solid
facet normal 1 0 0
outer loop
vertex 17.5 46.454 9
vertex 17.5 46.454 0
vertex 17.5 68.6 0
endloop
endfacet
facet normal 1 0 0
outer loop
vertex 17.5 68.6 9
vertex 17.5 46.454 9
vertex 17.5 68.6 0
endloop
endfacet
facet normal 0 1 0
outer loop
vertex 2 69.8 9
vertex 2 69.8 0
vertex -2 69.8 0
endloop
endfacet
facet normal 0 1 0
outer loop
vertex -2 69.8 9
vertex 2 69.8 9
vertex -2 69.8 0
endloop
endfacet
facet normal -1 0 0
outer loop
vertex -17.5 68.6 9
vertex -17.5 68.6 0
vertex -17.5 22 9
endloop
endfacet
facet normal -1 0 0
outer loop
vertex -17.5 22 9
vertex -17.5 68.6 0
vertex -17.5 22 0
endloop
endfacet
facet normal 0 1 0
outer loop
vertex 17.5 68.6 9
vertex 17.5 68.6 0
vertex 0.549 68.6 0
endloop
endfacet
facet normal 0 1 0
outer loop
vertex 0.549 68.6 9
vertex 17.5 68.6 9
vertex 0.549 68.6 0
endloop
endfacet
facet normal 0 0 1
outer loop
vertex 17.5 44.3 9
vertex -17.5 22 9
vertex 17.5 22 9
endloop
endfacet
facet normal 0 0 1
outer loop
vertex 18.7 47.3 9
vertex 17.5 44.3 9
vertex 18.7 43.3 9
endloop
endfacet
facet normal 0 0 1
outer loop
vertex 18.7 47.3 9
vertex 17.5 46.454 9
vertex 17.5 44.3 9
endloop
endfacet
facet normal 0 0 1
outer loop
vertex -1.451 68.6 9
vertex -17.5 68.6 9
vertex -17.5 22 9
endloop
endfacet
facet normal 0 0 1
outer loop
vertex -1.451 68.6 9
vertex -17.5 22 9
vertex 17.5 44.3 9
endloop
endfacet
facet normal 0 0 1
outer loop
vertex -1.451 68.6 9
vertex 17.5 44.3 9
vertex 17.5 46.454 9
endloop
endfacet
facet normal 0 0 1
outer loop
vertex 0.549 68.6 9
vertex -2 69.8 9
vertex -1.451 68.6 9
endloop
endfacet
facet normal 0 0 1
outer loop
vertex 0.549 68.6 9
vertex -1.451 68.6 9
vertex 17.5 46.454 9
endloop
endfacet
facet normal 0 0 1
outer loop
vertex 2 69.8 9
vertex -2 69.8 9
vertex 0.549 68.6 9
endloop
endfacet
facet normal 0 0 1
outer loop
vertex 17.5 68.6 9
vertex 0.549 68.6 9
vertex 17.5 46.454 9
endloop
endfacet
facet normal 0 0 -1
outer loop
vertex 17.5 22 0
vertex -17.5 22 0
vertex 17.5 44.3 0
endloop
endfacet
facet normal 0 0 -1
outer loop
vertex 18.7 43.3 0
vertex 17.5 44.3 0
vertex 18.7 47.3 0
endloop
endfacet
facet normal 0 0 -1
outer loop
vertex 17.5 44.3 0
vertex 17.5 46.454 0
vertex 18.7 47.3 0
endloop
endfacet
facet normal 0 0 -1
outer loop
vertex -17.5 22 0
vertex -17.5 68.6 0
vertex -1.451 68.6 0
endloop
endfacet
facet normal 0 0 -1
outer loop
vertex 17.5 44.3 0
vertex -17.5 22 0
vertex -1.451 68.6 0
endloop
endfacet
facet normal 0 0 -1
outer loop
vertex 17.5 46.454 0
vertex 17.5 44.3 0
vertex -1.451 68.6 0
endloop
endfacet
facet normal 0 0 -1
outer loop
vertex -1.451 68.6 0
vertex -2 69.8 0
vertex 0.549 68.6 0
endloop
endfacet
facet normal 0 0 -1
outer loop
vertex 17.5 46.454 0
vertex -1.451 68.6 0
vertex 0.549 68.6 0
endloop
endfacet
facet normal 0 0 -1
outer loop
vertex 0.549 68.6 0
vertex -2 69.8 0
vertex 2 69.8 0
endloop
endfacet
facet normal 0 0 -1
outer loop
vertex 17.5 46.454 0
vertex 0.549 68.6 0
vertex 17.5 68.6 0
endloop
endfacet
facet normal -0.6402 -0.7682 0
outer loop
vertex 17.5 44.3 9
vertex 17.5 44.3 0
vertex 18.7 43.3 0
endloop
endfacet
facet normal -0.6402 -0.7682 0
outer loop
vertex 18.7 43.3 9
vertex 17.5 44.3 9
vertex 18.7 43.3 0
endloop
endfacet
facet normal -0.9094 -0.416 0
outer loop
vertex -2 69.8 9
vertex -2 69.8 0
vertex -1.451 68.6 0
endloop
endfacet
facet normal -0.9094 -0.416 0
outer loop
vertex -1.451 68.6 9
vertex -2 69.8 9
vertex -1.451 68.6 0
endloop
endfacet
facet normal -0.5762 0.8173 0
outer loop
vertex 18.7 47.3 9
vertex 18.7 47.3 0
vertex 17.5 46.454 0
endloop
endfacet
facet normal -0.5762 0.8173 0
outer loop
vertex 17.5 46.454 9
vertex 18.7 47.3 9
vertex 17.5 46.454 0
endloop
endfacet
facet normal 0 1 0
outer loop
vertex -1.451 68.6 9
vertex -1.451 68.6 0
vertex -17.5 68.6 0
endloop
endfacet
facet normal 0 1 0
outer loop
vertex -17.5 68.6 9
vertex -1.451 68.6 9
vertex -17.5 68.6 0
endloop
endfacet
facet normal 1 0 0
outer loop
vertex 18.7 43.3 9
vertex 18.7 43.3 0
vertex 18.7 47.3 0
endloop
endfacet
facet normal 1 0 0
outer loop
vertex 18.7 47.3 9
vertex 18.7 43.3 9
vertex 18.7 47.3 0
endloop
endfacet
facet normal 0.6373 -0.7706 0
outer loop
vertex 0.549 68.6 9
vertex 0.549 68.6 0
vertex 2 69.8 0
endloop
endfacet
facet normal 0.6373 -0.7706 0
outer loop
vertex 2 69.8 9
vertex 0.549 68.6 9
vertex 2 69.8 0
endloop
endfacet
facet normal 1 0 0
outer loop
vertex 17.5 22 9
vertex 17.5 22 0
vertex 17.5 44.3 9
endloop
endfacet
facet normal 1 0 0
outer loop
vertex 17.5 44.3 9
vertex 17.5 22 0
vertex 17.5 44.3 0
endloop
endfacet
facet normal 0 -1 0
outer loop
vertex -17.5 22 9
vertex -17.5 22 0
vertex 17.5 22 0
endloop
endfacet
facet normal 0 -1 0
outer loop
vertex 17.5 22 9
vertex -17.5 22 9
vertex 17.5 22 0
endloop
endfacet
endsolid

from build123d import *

# Parameters (mm, degrees)
F0_W      = 50
F0_H      = 30
F1_DEPTH  = 25
F3_DEPTH  = 50
F5_R      = 5
F6_T      = -2.5
F7_R      = 10.7930870798
F8_DEPTH  = 25
F10_DEPTH = 9
F11_W     = 42
F11_H     = 73.1670876886
F12_DEPTH = 22.5


with BuildPart() as f1:
    # F0 (on Top) → F1 (new body)
    with BuildSketch(Plane.XY):
        Rectangle(F0_W, F0_H)
    extrude(amount=F1_DEPTH)


with BuildPart() as f3:
    # F2 (on face) → F3 (new body, through all)
    with BuildSketch(Plane.YZ.offset(25)):
        Polygon((-15, 0), (-15, 25), (-33.741876483, 0), align=None)
    extrude(amount=-F3_DEPTH)


with BuildPart() as f1_1:
    add(f1.part)

    # F4: union F3
    add(f3.part)

    # F5
    f5_edges = [f1_1.edges().sort_by_distance(p)[0] for p in [
        (25, -24.370938, 12.5),
        (-25, -24.370938, 12.5),
        (0, -15, 25),
        (25, 0, 25),
        (-25, 0, 25),
    ]]
    fillet(f5_edges, radius=F5_R)

    # F6
    f6_openings = [f1_1.faces().sort_by_distance(p)[0] for p in [
        (0, -9.243814, 0),
    ]]
    offset(amount=F6_T, openings=f6_openings)

    # F7 (on face) → F8 (cut)
    with BuildSketch(Plane(origin=(0, -21.6015379391, 16.1941342359), x_dir=(1, 0, 0), z_dir=(0, -0.8001247794, 0.5998335914))):
        with Locations((0, -5.4950344037)):
            Circle(F7_R)
    extrude(amount=-F8_DEPTH, mode=Mode.SUBTRACT)


with BuildPart() as f10:
    # F9 (on Top) → F10 (new body)
    with BuildSketch(Plane.XY):
        Polygon((-17.5, 68.6), (-17.5, 22), (17.5, 22), (17.5, 44.3), (17.5, 46.4536678502), (17.5, 68.6), (0.5493581668, 68.6), (-1.4506418332, 68.6), align=None)
        Polygon((17.5, 46.4536678502), (17.5, 44.3), (18.7, 43.3), (18.7, 47.3), align=None)
        Polygon((-2, 69.8), (-1.4506418332, 68.6), (0.5493581668, 68.6), (2, 69.8), align=None)
    extrude(amount=F10_DEPTH)


with BuildPart() as f12:
    # F11 (on Top) → F12 (new body, through all)
    with BuildSketch(Plane.XY):
        with Locations((0, 36.5835438443)):
            Rectangle(F11_W, F11_H)
    extrude(amount=F12_DEPTH)


with BuildPart() as f1_2:
    add(f1_1.part)

    # F13: cut F12
    add(f12.part, mode=Mode.SUBTRACT)


with BuildPart() as f14_1:
    # F14: copy of F1
    add(f1_2.part)


solid = f10.part
